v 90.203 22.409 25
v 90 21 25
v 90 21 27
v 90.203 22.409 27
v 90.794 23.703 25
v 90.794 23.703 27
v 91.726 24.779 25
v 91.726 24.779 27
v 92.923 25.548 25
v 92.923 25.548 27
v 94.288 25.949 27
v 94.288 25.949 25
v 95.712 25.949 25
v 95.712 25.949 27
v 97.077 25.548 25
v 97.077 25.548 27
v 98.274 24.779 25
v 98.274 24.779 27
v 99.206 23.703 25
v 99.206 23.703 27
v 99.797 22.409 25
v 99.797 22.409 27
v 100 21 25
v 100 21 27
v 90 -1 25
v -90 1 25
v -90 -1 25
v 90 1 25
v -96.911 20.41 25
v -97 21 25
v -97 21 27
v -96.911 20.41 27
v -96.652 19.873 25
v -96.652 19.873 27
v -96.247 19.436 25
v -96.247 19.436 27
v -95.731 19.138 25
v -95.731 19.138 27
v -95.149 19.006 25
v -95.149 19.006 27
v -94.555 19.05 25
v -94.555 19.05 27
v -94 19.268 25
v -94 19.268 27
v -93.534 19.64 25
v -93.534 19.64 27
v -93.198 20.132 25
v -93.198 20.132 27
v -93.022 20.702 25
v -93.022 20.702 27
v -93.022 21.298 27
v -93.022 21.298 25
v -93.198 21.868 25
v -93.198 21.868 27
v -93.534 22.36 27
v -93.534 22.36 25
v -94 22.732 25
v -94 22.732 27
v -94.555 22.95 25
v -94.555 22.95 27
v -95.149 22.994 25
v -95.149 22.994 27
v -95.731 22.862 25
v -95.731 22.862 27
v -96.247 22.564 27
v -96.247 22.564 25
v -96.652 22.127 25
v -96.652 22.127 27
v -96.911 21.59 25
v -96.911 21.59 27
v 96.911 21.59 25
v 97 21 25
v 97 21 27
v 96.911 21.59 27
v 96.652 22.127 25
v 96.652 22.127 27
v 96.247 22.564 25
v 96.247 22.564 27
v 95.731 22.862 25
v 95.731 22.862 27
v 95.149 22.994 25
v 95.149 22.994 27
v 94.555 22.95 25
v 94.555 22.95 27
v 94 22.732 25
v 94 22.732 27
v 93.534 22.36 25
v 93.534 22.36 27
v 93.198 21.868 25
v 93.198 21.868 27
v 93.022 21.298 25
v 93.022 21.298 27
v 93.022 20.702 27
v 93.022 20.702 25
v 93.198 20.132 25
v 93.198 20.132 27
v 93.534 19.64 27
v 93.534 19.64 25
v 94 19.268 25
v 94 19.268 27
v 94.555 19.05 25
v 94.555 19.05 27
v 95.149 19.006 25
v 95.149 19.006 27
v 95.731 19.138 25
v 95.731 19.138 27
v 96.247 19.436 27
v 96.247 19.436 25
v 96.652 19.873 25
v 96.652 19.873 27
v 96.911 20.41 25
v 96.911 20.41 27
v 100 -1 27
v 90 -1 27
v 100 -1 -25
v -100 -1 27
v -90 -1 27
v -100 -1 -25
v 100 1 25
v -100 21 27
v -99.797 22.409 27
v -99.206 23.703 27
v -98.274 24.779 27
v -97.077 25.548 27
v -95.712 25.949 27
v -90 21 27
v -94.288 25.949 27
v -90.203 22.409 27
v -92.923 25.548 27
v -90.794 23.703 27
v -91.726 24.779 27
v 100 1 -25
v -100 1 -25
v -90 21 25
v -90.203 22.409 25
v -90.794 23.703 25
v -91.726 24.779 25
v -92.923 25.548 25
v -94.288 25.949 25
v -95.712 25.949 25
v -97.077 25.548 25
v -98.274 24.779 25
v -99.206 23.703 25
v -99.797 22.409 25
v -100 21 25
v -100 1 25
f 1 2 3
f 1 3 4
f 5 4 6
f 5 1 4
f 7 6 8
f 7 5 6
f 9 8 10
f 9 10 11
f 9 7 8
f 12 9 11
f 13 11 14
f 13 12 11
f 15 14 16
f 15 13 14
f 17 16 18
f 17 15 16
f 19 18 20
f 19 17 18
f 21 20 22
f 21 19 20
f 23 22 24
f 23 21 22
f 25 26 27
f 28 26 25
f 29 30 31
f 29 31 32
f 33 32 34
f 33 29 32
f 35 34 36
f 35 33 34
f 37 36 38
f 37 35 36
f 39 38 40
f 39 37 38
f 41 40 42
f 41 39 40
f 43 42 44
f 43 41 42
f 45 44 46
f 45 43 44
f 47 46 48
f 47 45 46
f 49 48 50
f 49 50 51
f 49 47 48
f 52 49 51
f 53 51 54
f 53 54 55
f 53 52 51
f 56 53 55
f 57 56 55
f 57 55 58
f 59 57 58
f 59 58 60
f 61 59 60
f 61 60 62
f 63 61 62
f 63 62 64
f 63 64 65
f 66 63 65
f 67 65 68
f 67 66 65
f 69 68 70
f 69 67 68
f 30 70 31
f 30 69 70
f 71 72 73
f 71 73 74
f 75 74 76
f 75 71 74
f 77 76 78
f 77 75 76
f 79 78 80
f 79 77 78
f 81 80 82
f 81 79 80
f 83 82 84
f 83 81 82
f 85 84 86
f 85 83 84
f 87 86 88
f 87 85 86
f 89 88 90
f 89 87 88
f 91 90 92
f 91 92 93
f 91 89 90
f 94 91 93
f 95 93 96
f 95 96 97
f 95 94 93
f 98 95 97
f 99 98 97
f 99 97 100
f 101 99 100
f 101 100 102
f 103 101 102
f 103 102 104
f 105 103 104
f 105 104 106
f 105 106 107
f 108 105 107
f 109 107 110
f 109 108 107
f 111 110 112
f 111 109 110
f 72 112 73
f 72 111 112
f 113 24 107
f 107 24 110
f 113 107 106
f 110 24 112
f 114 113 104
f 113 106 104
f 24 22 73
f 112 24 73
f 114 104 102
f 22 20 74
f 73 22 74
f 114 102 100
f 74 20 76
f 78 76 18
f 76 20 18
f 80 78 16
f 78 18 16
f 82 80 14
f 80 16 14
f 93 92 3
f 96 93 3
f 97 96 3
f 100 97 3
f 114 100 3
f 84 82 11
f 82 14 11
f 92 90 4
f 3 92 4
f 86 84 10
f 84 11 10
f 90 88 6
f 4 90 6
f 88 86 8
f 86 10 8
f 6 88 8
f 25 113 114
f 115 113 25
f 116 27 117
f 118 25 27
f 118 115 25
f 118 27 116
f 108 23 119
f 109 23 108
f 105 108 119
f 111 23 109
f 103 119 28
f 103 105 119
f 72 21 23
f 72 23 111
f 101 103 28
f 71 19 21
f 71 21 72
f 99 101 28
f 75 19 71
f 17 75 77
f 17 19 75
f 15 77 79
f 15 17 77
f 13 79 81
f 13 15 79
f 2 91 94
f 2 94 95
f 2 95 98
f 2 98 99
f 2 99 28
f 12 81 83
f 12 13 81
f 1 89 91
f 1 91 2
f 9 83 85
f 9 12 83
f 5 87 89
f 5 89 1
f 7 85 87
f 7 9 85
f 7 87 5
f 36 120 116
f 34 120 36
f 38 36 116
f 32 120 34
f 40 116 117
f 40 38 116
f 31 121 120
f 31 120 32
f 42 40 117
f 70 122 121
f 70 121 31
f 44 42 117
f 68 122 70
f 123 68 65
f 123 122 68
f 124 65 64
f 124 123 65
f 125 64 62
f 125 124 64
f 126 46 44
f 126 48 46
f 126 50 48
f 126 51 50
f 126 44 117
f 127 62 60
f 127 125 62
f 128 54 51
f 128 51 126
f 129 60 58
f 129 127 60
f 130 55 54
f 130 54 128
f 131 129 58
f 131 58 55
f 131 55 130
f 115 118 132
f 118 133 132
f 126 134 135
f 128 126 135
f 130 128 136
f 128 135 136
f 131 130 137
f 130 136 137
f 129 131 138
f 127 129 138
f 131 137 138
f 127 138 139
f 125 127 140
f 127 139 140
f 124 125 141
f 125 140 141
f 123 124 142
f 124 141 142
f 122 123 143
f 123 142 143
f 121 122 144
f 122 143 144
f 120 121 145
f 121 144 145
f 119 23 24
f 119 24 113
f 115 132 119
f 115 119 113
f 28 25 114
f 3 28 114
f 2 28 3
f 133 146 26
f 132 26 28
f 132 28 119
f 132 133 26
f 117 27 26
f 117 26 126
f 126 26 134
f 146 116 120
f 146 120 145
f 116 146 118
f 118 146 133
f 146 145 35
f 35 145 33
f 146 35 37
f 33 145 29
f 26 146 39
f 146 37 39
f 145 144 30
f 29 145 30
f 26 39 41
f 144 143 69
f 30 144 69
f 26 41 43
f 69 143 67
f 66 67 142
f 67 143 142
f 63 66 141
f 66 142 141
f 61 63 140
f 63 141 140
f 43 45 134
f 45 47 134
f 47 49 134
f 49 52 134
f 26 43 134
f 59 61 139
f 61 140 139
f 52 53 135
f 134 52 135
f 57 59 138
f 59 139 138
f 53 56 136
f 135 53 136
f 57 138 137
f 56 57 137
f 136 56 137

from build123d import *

# Parameters (mm, degrees)
SKETCH3_W           = 200
SKETCH3_H           = 50
BOSS_EXTRUDE2_DEPTH = 1
SKETCH4_R           = 2
BOSS_EXTRUDE3_DEPTH = 2


with BuildPart() as part:
    # Sketch3 → Boss-Extrude2 (new, symmetric)
    with BuildSketch(Plane(origin=(0, 0, 0), x_dir=(1, 0, 0), z_dir=(0, 1, 0))):
        Rectangle(SKETCH3_W, SKETCH3_H)
    extrude(amount=BOSS_EXTRUDE2_DEPTH, both=True)

    # Sketch4 → Boss-Extrude3 (add)
    # profile 1 of 2: a face of its own
    with BuildSketch(Plane.XY.offset(25)):
        with BuildLine():
            Line((100, -1), (90, -1))
            Line((90, -1), (90, 21))
            ThreePointArc((90, 21), (95, 26), (100, 21))
            Line((100, 21), (100, -1))
        make_face()
        with Locations((95, 21)):
            Circle(SKETCH4_R, mode=Mode.SUBTRACT)
    # profile 2 of 2: a face of its own
    with BuildSketch(Plane.XY.offset(25)):
        with BuildLine():
            Line((-90, -1), (-90, 21))
            ThreePointArc((-90, 21), (-95, 26), (-100, 21))
            Line((-100, 21), (-100, -1))
            Line((-100, -1), (-90, -1))
        make_face()
        with Locations(Location((-95, 21, 0), (0, 0, 180))):
            Circle(SKETCH4_R, mode=Mode.SUBTRACT)
    extrude(amount=BOSS_EXTRUDE3_DEPTH)


solid = part.part
